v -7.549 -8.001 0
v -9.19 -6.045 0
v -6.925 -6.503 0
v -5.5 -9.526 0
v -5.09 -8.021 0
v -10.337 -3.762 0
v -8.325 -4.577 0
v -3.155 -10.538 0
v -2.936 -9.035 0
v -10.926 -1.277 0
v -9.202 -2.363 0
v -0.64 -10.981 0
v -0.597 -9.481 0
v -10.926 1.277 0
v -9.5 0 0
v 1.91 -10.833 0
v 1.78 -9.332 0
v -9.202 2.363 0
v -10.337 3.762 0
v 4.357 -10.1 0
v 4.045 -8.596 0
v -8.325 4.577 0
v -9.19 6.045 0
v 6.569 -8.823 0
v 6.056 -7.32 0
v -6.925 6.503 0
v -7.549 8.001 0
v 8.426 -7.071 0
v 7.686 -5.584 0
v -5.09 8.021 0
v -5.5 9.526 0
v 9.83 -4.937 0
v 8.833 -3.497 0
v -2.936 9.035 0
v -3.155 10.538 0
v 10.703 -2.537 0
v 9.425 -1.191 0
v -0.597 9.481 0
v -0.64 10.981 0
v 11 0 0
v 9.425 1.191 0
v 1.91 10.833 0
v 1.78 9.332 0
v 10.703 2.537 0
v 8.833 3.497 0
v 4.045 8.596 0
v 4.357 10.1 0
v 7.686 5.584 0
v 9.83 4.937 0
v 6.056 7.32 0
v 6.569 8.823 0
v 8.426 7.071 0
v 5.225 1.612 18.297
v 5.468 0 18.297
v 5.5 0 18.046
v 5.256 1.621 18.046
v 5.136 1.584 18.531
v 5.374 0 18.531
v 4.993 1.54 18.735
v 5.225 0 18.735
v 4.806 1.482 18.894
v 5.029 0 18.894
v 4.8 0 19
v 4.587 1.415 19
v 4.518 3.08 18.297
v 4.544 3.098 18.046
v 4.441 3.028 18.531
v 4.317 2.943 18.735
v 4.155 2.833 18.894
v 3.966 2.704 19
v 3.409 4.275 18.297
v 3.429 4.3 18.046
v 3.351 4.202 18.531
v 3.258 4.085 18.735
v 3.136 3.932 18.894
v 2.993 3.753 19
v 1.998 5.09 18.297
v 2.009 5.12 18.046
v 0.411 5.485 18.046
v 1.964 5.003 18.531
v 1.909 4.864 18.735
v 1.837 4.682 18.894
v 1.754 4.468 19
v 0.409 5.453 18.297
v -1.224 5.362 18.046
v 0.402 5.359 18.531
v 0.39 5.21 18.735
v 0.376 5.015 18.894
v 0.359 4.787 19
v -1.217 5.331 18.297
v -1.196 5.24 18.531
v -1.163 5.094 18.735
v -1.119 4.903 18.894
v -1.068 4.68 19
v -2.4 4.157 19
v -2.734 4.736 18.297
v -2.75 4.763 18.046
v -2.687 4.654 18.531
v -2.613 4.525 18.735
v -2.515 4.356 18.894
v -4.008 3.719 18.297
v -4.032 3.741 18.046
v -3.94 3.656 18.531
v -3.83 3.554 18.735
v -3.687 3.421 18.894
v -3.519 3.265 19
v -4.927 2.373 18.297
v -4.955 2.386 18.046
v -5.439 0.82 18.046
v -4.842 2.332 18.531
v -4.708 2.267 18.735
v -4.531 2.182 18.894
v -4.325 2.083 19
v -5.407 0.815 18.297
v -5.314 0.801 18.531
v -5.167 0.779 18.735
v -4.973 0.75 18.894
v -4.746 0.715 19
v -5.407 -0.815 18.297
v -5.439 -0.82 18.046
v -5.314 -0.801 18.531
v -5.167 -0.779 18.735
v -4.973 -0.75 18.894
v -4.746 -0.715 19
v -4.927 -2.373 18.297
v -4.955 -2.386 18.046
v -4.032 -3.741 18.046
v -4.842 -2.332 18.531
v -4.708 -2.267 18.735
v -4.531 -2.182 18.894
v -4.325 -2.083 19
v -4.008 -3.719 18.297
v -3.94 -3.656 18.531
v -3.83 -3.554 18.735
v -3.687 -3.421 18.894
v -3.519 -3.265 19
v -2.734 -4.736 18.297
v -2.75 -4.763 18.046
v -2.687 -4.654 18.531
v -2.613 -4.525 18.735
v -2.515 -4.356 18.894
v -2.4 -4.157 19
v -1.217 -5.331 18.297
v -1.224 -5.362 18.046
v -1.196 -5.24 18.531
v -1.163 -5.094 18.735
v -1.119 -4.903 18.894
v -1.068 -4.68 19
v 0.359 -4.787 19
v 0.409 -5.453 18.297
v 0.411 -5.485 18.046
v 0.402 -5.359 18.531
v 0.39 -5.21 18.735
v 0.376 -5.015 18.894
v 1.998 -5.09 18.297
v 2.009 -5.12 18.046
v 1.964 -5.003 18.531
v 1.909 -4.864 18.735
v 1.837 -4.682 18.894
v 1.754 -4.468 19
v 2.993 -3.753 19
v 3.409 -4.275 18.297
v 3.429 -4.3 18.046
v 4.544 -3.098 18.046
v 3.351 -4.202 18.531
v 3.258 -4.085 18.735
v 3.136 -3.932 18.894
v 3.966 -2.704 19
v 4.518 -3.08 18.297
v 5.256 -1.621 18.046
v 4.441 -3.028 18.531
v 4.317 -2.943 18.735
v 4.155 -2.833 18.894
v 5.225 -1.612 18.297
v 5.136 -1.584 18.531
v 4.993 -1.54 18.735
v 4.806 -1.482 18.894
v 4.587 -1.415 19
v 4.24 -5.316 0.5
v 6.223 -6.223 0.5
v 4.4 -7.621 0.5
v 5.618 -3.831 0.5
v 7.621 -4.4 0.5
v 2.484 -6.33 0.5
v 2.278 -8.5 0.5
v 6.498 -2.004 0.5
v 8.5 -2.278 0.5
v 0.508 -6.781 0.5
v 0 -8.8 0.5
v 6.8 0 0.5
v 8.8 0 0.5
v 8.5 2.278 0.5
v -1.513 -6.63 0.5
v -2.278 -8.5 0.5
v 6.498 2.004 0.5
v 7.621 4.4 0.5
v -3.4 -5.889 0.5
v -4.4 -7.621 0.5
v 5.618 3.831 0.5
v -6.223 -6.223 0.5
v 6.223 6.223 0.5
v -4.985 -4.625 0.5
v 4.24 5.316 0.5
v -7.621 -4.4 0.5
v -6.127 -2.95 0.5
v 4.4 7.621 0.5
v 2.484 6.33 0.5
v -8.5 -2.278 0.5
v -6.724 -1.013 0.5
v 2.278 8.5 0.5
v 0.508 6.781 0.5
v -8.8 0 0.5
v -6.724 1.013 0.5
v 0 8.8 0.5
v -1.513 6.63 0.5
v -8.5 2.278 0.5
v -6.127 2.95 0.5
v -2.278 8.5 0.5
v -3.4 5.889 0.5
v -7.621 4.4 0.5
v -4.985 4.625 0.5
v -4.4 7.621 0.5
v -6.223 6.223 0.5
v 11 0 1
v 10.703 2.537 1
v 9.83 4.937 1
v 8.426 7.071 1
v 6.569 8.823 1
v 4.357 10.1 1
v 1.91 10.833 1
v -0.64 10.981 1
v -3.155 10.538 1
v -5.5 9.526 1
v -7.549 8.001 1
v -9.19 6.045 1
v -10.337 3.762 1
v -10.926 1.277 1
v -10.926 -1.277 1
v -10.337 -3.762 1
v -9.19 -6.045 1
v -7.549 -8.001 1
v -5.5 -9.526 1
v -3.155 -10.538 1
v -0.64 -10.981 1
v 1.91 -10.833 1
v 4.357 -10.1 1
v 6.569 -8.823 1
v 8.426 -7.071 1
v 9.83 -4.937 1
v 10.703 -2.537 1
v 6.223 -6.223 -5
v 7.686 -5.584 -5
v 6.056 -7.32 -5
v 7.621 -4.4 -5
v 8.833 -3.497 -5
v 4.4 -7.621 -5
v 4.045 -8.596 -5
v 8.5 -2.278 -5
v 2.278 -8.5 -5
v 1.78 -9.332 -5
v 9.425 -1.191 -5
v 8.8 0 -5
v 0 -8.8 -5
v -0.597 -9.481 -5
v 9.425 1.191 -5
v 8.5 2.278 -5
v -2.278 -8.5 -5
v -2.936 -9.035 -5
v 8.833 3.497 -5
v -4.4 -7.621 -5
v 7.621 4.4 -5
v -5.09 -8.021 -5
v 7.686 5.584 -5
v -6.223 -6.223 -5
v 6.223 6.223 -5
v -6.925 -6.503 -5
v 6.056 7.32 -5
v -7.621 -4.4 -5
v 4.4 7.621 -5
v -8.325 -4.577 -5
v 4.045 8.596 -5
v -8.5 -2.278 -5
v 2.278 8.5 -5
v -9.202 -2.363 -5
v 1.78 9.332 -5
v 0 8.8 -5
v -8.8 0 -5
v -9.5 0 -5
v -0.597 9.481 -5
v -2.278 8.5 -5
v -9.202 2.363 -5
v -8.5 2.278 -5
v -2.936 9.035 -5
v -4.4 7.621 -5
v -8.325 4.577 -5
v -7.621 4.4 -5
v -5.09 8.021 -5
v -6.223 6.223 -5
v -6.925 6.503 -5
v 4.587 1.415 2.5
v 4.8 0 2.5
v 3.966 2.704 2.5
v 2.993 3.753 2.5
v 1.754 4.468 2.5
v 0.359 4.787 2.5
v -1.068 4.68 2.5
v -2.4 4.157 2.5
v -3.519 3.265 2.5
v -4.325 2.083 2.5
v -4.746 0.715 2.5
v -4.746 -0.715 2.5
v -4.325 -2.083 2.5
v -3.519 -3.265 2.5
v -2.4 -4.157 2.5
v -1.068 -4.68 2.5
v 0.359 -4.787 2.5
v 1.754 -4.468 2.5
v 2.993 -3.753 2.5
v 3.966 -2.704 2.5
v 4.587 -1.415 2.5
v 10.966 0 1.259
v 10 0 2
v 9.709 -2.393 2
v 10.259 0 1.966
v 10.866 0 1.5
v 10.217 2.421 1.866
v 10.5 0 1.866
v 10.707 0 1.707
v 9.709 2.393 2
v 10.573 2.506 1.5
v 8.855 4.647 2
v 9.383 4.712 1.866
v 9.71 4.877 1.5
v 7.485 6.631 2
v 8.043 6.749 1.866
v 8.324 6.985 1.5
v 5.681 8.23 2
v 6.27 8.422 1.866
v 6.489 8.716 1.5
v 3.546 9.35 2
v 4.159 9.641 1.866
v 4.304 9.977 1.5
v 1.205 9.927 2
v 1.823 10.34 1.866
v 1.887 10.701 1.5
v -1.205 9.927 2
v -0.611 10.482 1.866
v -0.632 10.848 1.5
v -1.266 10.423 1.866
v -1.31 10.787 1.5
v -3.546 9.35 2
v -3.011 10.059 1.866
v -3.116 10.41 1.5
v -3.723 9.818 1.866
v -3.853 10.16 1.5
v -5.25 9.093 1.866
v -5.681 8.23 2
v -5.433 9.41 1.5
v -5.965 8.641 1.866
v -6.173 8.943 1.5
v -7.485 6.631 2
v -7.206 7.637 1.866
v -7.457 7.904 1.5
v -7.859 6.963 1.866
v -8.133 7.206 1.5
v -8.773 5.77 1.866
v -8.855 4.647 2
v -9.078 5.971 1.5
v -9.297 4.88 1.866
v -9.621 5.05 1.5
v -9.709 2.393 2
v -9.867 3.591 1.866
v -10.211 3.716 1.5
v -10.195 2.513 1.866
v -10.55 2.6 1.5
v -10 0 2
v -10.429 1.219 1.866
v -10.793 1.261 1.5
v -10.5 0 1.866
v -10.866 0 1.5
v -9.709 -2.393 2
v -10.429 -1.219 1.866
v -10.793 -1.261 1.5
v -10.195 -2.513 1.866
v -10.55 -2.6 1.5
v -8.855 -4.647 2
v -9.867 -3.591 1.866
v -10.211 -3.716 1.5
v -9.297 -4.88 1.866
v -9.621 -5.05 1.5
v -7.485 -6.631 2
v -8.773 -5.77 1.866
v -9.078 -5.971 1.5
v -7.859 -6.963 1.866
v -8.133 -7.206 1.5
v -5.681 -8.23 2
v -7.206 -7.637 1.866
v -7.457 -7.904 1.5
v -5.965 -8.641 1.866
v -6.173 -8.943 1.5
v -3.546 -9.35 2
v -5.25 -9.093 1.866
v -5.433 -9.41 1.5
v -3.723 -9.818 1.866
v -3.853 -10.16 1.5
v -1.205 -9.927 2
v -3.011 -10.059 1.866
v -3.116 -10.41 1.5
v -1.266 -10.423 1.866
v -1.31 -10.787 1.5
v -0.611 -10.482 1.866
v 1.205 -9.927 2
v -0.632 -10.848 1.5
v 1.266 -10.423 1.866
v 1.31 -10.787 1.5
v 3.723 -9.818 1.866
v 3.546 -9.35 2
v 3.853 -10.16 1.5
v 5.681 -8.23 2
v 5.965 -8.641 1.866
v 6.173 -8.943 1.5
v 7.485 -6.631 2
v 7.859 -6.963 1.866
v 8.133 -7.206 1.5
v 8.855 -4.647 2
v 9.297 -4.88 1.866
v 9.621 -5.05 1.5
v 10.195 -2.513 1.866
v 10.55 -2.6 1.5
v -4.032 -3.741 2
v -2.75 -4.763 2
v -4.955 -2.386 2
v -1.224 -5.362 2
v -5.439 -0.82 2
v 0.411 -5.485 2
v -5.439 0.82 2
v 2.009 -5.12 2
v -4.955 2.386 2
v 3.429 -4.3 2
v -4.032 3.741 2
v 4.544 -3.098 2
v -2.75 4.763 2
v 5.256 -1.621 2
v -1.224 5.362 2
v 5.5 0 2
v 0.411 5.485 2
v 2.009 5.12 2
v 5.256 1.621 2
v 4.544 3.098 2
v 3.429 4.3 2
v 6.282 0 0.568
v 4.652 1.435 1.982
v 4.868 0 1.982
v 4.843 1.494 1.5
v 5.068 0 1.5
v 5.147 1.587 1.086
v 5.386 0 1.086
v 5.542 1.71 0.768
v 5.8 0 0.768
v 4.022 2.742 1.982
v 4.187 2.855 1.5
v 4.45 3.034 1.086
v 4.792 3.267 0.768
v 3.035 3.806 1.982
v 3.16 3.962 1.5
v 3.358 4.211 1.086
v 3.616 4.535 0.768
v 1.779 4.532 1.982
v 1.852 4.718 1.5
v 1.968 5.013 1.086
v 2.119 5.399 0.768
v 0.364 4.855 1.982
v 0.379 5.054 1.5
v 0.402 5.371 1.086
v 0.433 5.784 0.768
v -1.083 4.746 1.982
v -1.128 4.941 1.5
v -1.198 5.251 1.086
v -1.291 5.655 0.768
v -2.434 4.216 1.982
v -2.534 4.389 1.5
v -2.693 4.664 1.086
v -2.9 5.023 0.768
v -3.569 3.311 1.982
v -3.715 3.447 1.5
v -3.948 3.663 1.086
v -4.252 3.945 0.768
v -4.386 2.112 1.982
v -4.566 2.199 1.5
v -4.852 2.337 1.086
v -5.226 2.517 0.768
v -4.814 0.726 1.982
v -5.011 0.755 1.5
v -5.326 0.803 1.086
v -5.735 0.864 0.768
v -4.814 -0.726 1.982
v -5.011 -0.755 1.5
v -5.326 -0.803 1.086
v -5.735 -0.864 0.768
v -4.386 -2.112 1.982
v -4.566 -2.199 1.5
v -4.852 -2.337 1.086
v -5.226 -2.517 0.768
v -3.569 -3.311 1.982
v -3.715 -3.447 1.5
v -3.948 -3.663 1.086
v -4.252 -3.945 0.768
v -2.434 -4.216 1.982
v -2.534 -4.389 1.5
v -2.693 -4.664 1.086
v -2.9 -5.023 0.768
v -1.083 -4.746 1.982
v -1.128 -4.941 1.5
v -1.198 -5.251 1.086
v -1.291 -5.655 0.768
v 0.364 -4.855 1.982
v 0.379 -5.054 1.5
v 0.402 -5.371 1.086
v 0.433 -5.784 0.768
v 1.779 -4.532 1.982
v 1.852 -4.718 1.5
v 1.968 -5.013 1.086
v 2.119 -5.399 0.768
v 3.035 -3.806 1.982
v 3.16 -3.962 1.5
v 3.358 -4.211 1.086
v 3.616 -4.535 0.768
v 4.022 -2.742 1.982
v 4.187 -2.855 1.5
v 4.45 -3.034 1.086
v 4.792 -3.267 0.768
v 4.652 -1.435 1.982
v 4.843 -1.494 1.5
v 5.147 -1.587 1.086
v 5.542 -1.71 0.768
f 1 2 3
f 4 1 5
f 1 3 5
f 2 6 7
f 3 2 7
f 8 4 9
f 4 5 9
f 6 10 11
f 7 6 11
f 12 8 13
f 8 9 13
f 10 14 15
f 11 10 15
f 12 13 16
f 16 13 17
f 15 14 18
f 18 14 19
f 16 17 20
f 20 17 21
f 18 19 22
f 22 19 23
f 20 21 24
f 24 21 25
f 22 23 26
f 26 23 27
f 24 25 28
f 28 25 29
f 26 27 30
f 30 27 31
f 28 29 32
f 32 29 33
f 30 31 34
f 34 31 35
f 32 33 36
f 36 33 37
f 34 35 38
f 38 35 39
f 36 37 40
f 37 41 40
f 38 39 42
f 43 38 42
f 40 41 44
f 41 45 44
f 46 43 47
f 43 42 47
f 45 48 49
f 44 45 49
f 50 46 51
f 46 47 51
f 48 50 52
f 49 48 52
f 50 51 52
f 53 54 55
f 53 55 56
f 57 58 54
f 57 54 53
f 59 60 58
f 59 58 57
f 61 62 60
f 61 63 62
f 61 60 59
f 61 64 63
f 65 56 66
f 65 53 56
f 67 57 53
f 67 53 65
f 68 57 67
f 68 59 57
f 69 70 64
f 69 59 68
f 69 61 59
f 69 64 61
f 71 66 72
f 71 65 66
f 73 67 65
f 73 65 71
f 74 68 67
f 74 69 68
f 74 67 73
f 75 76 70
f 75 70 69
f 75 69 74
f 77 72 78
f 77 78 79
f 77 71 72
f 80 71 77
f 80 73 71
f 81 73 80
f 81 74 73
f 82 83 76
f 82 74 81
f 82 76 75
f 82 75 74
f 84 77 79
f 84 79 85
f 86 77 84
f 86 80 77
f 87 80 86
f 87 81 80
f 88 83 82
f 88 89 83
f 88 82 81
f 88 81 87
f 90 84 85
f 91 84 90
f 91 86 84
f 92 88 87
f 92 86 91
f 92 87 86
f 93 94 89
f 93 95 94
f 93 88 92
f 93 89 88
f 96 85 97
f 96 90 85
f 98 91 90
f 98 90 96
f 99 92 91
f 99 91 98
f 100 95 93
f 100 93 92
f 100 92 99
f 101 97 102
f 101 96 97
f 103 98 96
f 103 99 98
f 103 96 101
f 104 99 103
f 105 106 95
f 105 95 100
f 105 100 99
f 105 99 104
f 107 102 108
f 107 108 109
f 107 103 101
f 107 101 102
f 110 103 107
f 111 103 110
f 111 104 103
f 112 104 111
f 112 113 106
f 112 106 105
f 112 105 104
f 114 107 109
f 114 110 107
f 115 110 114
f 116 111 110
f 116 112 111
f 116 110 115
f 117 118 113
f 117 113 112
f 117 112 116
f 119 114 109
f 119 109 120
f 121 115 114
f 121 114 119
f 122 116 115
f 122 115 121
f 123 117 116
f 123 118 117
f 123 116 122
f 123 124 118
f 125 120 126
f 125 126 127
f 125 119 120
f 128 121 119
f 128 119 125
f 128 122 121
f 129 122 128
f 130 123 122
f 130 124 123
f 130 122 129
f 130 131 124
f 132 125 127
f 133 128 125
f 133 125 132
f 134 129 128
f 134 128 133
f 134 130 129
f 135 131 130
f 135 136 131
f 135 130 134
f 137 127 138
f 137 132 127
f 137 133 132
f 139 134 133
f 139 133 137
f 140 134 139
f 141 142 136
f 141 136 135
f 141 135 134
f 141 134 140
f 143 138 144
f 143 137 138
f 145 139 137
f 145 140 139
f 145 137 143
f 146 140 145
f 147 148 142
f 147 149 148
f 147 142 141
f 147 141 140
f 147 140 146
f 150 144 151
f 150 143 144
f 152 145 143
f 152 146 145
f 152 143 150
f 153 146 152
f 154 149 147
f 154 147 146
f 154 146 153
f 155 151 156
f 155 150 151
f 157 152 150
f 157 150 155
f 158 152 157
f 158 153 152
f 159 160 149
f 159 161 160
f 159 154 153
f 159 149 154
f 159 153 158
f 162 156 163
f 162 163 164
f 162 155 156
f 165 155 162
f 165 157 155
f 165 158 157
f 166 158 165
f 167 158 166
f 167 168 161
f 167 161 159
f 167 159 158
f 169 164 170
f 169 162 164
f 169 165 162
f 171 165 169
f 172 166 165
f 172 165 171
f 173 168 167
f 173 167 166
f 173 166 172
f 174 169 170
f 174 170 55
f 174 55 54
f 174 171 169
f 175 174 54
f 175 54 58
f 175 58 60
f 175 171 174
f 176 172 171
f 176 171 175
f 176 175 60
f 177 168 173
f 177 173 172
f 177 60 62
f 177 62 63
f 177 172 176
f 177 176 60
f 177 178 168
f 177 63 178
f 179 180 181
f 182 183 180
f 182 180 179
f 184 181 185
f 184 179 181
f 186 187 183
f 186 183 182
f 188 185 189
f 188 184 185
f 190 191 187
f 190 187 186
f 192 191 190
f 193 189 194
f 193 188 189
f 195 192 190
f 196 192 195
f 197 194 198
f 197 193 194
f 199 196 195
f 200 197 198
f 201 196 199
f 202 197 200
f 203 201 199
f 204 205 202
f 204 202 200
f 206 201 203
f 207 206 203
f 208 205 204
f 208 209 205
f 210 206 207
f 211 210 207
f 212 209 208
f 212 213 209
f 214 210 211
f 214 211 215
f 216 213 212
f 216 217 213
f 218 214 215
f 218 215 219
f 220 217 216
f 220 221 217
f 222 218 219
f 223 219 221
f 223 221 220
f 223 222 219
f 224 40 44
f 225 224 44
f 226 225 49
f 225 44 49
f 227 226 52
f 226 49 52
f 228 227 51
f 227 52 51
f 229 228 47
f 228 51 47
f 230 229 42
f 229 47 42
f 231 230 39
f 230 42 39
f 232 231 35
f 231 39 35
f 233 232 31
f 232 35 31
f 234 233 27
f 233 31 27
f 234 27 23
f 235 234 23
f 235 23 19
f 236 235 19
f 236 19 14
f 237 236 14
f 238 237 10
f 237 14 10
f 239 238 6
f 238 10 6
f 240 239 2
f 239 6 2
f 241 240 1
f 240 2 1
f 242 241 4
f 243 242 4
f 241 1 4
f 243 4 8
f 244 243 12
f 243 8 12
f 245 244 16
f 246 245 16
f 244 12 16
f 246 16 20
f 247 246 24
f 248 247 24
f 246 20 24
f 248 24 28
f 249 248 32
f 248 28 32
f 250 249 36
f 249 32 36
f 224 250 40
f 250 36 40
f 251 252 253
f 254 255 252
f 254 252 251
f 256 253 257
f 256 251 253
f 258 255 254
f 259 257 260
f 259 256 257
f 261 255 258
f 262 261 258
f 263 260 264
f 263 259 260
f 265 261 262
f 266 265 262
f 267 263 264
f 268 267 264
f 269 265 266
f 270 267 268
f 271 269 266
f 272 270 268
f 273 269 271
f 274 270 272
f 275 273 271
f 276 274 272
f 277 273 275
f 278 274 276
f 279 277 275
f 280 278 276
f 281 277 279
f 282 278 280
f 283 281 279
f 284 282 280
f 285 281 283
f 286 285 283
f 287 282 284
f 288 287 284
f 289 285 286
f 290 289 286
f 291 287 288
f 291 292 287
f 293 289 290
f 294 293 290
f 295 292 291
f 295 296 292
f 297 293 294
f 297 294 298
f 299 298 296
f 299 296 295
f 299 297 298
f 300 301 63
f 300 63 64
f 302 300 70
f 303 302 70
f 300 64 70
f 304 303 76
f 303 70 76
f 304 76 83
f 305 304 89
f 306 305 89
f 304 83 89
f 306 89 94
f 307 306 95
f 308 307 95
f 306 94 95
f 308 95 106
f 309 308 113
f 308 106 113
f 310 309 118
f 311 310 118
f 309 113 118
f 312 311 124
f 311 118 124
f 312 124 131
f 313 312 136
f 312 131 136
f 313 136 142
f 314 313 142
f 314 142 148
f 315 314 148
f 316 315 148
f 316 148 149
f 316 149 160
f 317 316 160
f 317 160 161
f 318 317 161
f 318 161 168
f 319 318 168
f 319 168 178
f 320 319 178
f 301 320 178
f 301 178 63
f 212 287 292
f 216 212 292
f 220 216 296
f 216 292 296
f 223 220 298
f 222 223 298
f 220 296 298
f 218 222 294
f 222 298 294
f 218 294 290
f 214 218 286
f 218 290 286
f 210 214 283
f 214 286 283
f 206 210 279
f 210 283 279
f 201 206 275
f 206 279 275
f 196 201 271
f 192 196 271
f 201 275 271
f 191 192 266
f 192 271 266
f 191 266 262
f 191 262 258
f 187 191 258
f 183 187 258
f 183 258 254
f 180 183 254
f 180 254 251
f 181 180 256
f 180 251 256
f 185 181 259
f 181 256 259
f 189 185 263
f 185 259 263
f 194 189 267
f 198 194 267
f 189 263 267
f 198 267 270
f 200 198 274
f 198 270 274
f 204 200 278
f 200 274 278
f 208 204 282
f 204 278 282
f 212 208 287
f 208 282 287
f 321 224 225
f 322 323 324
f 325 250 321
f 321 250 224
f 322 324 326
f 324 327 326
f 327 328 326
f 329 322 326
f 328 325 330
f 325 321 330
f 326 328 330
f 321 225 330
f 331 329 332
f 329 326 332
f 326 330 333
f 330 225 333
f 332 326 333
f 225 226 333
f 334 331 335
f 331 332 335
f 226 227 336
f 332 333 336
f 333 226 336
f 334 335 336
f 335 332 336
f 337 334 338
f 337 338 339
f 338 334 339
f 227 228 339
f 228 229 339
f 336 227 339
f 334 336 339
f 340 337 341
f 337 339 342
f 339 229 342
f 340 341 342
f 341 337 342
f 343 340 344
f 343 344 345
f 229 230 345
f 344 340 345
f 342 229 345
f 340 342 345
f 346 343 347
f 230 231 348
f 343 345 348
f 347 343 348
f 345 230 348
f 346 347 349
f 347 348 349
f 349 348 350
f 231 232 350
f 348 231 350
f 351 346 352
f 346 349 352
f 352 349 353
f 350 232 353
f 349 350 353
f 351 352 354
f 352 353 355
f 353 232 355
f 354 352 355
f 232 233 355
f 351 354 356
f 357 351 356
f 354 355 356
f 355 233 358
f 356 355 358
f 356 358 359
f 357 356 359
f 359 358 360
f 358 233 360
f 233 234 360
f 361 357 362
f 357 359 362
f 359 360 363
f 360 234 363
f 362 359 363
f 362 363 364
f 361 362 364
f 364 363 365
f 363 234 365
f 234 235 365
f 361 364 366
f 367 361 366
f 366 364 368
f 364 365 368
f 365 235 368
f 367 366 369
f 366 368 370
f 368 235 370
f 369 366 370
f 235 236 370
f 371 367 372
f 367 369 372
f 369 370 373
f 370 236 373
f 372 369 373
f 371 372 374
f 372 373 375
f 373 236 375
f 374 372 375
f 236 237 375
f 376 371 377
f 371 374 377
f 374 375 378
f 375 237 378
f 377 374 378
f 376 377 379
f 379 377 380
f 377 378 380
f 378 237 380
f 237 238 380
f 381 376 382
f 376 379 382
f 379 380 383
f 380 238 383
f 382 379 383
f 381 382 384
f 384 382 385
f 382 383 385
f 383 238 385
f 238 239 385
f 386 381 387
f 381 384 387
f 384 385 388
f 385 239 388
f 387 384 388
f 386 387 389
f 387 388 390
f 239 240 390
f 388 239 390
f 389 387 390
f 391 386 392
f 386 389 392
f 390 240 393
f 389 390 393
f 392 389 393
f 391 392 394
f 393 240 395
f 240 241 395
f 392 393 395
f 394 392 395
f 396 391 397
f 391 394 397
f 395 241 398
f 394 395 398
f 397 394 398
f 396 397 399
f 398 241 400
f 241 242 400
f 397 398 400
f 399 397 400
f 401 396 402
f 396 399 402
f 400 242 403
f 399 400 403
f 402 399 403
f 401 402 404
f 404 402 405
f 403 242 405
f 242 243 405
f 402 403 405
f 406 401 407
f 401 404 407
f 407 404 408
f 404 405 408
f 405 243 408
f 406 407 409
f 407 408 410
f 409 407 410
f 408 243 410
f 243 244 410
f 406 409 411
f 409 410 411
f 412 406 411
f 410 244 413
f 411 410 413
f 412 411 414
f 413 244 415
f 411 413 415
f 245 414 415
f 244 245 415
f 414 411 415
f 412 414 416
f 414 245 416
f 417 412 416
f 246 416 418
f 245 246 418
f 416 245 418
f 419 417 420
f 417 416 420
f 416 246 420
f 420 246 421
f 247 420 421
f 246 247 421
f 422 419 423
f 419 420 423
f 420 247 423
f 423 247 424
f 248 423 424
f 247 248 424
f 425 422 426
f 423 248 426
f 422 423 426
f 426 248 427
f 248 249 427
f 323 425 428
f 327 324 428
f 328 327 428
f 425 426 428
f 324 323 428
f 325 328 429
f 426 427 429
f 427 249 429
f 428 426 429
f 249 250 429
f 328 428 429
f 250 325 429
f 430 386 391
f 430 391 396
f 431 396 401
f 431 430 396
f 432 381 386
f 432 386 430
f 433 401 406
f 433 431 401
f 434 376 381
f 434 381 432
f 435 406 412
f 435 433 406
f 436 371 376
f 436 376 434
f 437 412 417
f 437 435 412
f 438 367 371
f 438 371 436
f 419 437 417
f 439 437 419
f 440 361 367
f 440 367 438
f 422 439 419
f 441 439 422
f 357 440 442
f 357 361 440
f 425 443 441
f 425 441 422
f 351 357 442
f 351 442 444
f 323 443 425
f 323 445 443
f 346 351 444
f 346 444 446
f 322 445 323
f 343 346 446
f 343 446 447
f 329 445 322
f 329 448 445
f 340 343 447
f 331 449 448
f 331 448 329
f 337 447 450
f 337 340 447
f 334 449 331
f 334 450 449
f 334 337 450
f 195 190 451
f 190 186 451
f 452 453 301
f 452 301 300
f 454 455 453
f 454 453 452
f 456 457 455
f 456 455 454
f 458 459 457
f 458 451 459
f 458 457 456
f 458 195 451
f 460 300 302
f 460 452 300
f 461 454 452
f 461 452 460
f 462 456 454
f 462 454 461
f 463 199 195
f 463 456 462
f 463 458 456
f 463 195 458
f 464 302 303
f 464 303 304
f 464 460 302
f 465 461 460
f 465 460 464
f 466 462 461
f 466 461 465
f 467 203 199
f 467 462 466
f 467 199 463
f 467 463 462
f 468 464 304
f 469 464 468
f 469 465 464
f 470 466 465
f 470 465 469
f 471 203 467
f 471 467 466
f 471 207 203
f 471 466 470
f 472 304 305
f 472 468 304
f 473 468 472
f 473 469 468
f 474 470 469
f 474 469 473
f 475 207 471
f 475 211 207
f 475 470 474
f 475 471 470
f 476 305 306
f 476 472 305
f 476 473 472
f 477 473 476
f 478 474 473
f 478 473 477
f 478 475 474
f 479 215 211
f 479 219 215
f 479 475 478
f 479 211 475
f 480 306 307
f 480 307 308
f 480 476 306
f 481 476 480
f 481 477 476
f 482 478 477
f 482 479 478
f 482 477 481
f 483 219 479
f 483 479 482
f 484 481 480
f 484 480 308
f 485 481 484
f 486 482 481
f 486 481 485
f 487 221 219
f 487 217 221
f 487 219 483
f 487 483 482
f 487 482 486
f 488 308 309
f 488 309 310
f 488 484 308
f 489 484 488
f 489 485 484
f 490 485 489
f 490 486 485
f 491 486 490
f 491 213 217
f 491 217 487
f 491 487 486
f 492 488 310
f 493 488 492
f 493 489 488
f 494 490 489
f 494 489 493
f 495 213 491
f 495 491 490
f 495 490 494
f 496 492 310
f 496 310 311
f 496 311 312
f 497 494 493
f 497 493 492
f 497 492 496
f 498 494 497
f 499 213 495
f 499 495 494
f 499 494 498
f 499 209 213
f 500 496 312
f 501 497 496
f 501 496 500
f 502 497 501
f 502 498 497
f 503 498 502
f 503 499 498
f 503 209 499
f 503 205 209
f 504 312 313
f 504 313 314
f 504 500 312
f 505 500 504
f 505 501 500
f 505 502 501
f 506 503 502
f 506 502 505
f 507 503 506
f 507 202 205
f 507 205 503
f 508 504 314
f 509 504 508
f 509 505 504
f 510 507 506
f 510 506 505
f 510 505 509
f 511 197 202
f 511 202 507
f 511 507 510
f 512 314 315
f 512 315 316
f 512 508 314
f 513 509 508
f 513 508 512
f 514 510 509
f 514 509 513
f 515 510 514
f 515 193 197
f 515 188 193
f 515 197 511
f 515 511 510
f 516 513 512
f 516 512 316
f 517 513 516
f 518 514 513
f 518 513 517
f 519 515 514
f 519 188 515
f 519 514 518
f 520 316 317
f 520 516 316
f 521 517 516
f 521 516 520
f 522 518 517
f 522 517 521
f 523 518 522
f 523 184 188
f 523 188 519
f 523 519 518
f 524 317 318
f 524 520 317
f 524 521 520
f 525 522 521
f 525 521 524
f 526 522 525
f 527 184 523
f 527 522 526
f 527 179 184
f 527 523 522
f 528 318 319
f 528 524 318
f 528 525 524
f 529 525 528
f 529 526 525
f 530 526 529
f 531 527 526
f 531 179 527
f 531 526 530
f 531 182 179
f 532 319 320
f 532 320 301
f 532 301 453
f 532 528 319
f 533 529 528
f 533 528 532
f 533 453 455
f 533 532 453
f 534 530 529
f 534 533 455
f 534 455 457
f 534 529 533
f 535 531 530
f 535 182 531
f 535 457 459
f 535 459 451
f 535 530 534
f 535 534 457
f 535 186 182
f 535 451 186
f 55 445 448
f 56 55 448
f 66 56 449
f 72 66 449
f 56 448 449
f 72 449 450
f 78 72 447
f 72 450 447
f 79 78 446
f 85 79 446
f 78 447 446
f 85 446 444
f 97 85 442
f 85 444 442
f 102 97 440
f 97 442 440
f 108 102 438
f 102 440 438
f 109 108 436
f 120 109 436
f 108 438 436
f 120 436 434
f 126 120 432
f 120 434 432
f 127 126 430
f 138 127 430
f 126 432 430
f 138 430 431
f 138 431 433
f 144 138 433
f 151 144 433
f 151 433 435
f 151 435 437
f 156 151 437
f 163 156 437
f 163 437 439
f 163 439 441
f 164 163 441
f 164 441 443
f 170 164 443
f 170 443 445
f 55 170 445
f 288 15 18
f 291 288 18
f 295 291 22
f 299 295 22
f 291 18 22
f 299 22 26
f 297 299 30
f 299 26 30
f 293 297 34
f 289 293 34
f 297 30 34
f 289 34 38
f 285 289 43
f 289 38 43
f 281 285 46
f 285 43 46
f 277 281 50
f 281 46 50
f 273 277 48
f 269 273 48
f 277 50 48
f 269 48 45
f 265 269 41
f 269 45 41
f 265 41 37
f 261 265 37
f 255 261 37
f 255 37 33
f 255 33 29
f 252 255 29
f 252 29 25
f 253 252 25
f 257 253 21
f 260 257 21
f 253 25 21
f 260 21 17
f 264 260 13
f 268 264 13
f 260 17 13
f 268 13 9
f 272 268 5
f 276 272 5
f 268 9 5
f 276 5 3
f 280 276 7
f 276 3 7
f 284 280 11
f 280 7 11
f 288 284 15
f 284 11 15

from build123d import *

# Parameters (mm, degrees)
SKETCH1_R           = 11
BOSS_EXTRUDE1_DEPTH = 2
SKETCH2_R           = 9.5
BOSS_EXTRUDE2_DEPTH = 5
SKETCH3_R           = 5.5
BOSS_EXTRUDE3_DEPTH = 17
SKETCH4_R           = 4.8
CUT_EXTRUDE1_DEPTH  = 25
SKETCH5_R           = 8.8
CUT_EXTRUDE2_DEPTH  = 5.5
FILLET1_R           = 2
FILLET2_R           = 1
FILLET3_R           = 1


with BuildPart() as part:
    # Sketch1 → Boss-Extrude1 (new body)
    with BuildSketch(Plane.XY):
        Circle(SKETCH1_R)
    extrude(amount=BOSS_EXTRUDE1_DEPTH)

    # Sketch2 → Boss-Extrude2 (add)
    with BuildSketch(Plane(origin=(0, 0, 0), x_dir=(-1, 0, 0), z_dir=(0, 0, -1))):
        Circle(SKETCH2_R)
    extrude(amount=BOSS_EXTRUDE2_DEPTH)

    # Sketch3 → Boss-Extrude3 (add)
    with BuildSketch(Plane.XY.offset(2)):
        Circle(SKETCH3_R)
    extrude(amount=BOSS_EXTRUDE3_DEPTH)

    # Sketch4 → Cut-Extrude1 (cut)
    with BuildSketch(Plane.XY.offset(19)):
        Circle(SKETCH4_R)
    extrude(amount=-CUT_EXTRUDE1_DEPTH, mode=Mode.SUBTRACT)

    # Sketch5 → Cut-Extrude2 (cut)
    with BuildSketch(Plane(origin=(0, 0, -5), x_dir=(-1, 0, 0), z_dir=(0, 0, -1))):
        Circle(SKETCH5_R)
    extrude(amount=-CUT_EXTRUDE2_DEPTH, mode=Mode.SUBTRACT)

    # Fillet1
    fillet1_edges = [part.edges().sort_by_distance(p)[0] for p in [
        (-4.8, 0, 0.5),
    ]]
    fillet(fillet1_edges, radius=FILLET1_R)

    # Fillet2
    fillet2_edges = [part.edges().sort_by_distance(p)[0] for p in [
        (-11, 0, 2),
    ]]
    fillet(fillet2_edges, radius=FILLET2_R)

    # Fillet3
    # the kernel refuses this fillet: 1 mm, written as the material it takes off along each edge
    with BuildSketch(Plane(origin=(0, 0, 19), x_dir=(1, 0, 0), z_dir=(0, -1, 0))) as fillet3_piece_1:
        with BuildLine():
            CenterArc((4.5, -0.953939201), FILLET3_R, 0, 72.542396876)
            Line((4.8, 0), (4.806, 0.019078784))
            ThreePointArc((4.806, 0.019078784), (5.15, 0.02), (5.5, 0.02))
            Line((5.5, 0.02), (5.52, 0))
            Line((5.52, 0), (5.52, -0.953939201))
            Line((5.52, -0.953939201), (5.5, -0.953939201))
        make_face()
    revolve(axis=Axis((0, 0, 19), (0, 0, 1)), mode=Mode.SUBTRACT)


solid = part.part
